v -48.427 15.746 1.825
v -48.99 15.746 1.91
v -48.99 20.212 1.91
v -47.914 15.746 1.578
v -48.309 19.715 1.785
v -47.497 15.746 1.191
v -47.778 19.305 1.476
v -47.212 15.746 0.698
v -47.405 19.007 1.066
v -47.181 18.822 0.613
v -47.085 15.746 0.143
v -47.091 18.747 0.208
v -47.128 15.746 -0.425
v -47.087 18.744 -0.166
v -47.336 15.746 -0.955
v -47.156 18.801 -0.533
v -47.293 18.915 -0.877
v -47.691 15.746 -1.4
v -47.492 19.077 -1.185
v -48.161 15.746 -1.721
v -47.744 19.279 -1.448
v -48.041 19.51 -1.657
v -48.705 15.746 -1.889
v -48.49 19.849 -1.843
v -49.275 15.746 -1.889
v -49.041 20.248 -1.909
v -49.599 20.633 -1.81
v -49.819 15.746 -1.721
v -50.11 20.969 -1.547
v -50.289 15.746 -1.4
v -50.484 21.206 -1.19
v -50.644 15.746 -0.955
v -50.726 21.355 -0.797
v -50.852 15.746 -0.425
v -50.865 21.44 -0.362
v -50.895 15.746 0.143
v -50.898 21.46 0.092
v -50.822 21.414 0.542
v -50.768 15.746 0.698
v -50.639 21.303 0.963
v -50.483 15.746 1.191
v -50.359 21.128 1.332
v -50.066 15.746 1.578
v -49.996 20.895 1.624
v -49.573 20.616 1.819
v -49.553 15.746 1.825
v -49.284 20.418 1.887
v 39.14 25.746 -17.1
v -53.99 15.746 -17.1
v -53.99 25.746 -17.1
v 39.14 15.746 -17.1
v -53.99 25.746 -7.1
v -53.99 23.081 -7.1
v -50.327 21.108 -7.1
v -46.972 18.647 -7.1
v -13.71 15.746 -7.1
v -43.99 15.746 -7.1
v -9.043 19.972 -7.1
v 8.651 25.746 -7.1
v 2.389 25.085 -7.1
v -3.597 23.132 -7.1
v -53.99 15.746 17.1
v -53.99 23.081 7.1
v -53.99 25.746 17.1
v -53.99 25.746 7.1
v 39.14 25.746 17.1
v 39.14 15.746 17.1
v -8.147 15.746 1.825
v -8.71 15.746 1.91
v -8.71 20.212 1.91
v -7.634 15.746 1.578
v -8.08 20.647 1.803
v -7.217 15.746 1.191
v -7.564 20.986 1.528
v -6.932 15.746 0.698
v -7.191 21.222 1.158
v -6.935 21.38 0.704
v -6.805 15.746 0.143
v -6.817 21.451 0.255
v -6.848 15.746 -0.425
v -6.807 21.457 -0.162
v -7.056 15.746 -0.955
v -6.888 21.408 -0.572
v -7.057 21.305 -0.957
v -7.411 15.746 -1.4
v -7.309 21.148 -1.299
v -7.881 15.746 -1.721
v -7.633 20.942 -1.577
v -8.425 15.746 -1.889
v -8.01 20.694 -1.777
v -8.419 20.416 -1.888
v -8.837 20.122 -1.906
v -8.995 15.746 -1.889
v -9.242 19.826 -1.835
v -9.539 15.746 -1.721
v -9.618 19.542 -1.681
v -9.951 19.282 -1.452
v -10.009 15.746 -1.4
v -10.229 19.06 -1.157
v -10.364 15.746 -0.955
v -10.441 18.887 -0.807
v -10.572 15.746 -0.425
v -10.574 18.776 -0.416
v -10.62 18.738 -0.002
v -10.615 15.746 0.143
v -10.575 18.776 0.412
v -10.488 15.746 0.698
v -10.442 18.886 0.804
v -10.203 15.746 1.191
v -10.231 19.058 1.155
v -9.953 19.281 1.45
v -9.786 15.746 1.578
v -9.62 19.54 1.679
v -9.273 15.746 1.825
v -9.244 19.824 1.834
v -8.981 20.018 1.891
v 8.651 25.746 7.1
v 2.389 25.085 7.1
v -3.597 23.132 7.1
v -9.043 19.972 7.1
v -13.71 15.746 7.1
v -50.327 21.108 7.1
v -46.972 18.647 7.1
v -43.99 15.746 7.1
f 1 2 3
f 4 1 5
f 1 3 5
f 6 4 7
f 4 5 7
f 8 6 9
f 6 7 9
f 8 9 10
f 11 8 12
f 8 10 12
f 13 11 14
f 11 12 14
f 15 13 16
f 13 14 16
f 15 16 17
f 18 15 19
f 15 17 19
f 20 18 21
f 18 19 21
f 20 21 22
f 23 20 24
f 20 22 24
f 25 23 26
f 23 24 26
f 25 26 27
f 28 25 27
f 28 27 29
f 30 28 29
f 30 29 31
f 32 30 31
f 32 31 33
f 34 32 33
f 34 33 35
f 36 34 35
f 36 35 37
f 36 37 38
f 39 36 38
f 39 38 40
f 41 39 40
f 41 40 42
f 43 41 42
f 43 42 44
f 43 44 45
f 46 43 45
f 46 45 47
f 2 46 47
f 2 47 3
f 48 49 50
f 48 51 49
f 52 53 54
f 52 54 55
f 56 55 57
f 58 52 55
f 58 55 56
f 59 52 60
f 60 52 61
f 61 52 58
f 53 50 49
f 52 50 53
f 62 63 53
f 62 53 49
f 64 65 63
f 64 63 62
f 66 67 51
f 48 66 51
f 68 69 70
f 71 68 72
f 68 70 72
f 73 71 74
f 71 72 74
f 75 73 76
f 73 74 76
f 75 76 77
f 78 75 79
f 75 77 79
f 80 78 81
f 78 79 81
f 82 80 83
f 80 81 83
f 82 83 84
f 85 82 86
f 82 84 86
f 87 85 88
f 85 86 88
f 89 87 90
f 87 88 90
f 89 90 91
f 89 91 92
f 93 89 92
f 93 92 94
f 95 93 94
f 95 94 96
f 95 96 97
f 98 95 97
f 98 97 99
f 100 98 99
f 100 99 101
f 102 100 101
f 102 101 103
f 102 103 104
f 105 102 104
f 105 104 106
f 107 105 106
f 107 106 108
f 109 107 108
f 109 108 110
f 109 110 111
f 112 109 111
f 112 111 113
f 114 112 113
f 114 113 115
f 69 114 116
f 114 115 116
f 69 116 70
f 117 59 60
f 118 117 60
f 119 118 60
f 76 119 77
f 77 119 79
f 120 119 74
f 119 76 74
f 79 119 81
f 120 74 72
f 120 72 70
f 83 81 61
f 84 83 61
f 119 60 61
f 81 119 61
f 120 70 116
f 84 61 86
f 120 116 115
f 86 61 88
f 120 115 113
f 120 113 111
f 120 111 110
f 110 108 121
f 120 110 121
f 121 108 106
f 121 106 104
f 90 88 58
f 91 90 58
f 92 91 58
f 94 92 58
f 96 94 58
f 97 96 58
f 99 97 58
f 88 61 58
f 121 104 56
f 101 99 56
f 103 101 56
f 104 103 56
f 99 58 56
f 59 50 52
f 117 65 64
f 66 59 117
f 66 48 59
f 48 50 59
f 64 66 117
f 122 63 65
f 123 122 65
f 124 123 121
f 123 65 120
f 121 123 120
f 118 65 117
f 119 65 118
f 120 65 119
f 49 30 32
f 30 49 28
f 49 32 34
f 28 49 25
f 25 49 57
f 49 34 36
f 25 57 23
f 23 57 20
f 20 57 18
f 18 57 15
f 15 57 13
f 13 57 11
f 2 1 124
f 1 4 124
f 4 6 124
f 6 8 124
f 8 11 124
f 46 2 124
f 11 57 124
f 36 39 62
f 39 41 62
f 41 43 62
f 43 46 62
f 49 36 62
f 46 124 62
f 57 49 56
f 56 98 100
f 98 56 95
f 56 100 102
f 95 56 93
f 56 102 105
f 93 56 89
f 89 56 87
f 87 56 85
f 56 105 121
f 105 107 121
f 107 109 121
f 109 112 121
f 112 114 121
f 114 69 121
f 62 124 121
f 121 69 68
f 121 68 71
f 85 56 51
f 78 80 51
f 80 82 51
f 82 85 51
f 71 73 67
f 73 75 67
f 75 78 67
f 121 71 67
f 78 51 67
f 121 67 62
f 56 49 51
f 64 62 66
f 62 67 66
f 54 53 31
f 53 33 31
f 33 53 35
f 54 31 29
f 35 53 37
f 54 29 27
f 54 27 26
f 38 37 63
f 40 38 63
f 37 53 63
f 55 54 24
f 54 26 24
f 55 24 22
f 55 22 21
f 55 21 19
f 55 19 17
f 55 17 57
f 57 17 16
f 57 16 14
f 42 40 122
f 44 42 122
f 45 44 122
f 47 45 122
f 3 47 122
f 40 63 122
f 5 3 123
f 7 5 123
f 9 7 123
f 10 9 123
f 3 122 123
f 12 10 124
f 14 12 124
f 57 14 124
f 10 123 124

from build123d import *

# Parameters (mm, degrees)
SKETCH_1_W                = 50.28
SKETCH_1_H                = 34.2
SKETCH_1_W_2              = 30.28
SKETCH_1_H_2              = 14.2
EXTRUDE_1_DEPTH           = 12.25
SKETCH_4_W                = 13
SKETCH_4_H                = 13.91
EXTRUDE_1_2_DEPTH         = 74.82
SKETCH_5_W                = 13.91
SKETCH_5_H                = 16.23
EXTRUDE_2_DEPTH           = 16
SKETCH_7_R                = 25.25
SKETCH_7_R_2              = 15.25
EXTRUDE_2_2_DEPTH         = 16.23
SKETCH_15_R               = 1.91
CUT_EXTRUDE_6_DEPTH       = 97.964478439
SKETCH_18_W               = 49.344544624
SKETCH_18_H               = 6.125
CUT_EXTRUDE_8_DEPTH       = 101.789238284
SKETCH_19_W               = 34.2
SKETCH_19_H               = 6.125
CUT_EXTRUDE_9_DEPTH       = 10
SKETCH_21_R               = 1.91
CUT_EXTRUDE_10_DEPTH      = 10
SKETCH_20_R               = 1.91
CUT_EXTRUDE_11_DEPTH      = 10
FILLET_START              = -7.1
FILLET_1_DEPTH            = 14.2
FILLET_2_DEPTH            = 14.2
SKETCH_29_W               = 13.91
SKETCH_29_H               = 74.82
EXTRUDE_5_DEPTH           = 10
SKETCH_30_W               = 10
SKETCH_30_H               = 58.59
CUT_EXTRUDE_13_DEPTH      = 97.964478439
SKETCH_32_W               = 34.2
SKETCH_32_H               = 5.745736365
EXTRUDE_6_DEPTH           = 10
CUT_EXTRUDE_16_DEPTH      = 50
CUT_EXTRUDE_16_DEPTH_BACK = 50
SKETCH_38_W               = 116.985630298
SKETCH_38_H               = 80.538350638
SKETCH_41_W               = 13.91
SKETCH_41_H               = 5.745736365
EXTRUDE_7_DEPTH           = 3
SKETCH_42_W               = 13
SKETCH_42_H               = 13.91
EXTRUDE_8_DEPTH           = 74.82
SKETCH_43_W               = 13.91
SKETCH_43_H               = 16.23
EXTRUDE_9_DEPTH           = 15.22
SKETCH_44_R               = 1.91
CUT_EXTRUDE_17_DEPTH      = 15.22
SKETCH_46_R               = 25.25
SKETCH_46_R_2             = 15.25
EXTRUDE_6_2_DEPTH         = 16.23
EXTRUDE_10_DEPTH          = 7.22
EXTRUDE_10_DEPTH_BACK     = 10
SKETCH_47_W               = 13.91
SKETCH_47_H               = 16.23
SKETCH_50_W               = 3.056753925
SKETCH_50_H               = 16.23
CUT_EXTRUDE_18_DEPTH      = 96.578211037
SKETCH_51_R               = 1.91
CUT_EXTRUDE_19_DEPTH      = 95.015226304
SKETCH_52_W               = 92.841945613
SKETCH_52_H               = 30
CUT_EXTRUDE_20_DEPTH      = 84.840694713
CUT_EXTRUDE_22_DEPTH      = 50
CUT_EXTRUDE_22_DEPTH_BACK = 50
SKETCH_53_W               = 63.541345486
SKETCH_53_H               = 14.170740414
SKETCH_54_W               = 10
SKETCH_54_H               = 10.145
CUT_EXTRUDE_23_DEPTH      = 50
SKETCH_55_W               = 13
SKETCH_55_H               = 13.91
EXTRUDE_11_DEPTH          = 10
SKETCH_57_W               = 15
SKETCH_57_H               = 34.2
EXTRUDE_12_DEPTH          = 10
SKETCH_58_W               = 34.2
SKETCH_58_H               = 10
EXTRUDE_13_DEPTH          = 27.85
SKETCH_60_W               = 34.2
SKETCH_60_H               = 10
EXTRUDE_14_DEPTH          = 50.28
SKETCH_62_W               = 30.28
SKETCH_62_H               = 14.2
CUT_EXTRUDE_24_DEPTH      = 50.28
SKETCH_64_R               = 1.91
CUT_EXTRUDE_25_DEPTH      = 10
FILLET_3_R                = 30
CUT_EXTRUDE_27_DEPTH      = 40
CUT_EXTRUDE_27_DEPTH_BACK = 40
SKETCH_69_W               = 103.83153819
SKETCH_69_H               = 99.848427979


with BuildPart() as part:
    # 草圖1 → Extrude 1 (new body)
    with BuildSketch(Plane(origin=(0, 0, 0), x_dir=(1, 0, 0), z_dir=(0, 1, 0))):
        Rectangle(SKETCH_1_W, SKETCH_1_H)
        Rectangle(SKETCH_1_W_2, SKETCH_1_H_2, mode=Mode.SUBTRACT)
    extrude(amount=EXTRUDE_1_DEPTH)

    # 草圖4 → Extrude 1 2 (add)
    with BuildSketch(Plane.XZ):
        with Locations((18.64, 0)):
            Rectangle(SKETCH_4_W, SKETCH_4_H)
    extrude(amount=EXTRUDE_1_2_DEPTH)

    # 草圖5 → Extrude 2 (add)
    with BuildSketch(Plane.ZY.offset(-12.14)):
        with Locations((0, -66.705)):
            Rectangle(SKETCH_5_W, SKETCH_5_H)
    extrude(amount=EXTRUDE_2_DEPTH)

    # 草圖7 → Extrude 2 2 (add)
    with BuildSketch(Plane(origin=(3.626674765, -74.82, 0), x_dir=(1, 0, 0), z_dir=(0, -1, 0))):
        with Locations((-30.978154344, 0)):
            Circle(SKETCH_7_R)
        with Locations((-30.978154344, 0)):
            Circle(SKETCH_7_R_2, mode=Mode.SUBTRACT)
    extrude(amount=-EXTRUDE_2_2_DEPTH)

    # 草圖15 → 除料-伸長6 (cut, through all)
    with BuildSketch(Plane(origin=(0, 0, -6.955), x_dir=(-1, 0, 0), z_dir=(0, 0, -1))):
        with Locations((-4.530883248, -66.705)):
            Circle(SKETCH_15_R)
    extrude(amount=-CUT_EXTRUDE_6_DEPTH, mode=Mode.SUBTRACT)

    # 草圖18 → 除料-伸長8 (cut, through all)
    with BuildSketch(Plane(origin=(0, 0, -17.1), x_dir=(-1, 0, 0), z_dir=(0, 0, -1))):
        with Locations((0.467727688, 9.1875)):
            Rectangle(SKETCH_18_W, SKETCH_18_H)
    extrude(amount=-CUT_EXTRUDE_8_DEPTH, mode=Mode.SUBTRACT)

    # 草圖19 → 除料-伸長9 (cut)
    with BuildSketch(Plane.ZY.offset(-24.204544624)):
        with Locations((0, 9.1875)):
            Rectangle(SKETCH_19_W, SKETCH_19_H)
    extrude(amount=-CUT_EXTRUDE_9_DEPTH, mode=Mode.SUBTRACT)

    # 草圖21 → 除料-伸長10 (cut)
    with BuildSketch(Plane(origin=(0, 6.125, 0), x_dir=(1, 0, 0), z_dir=(0, 1, 0))):
        with Locations(Location((17.69, 0, 0), (0, 0, 270))):
            Circle(SKETCH_21_R)
    extrude(amount=-CUT_EXTRUDE_10_DEPTH, mode=Mode.SUBTRACT)

    # 草圖20 → 除料-伸長11 (cut)
    with BuildSketch(Plane(origin=(0, 6.125, 0), x_dir=(1, 0, 0), z_dir=(0, 1, 0))):
        with Locations(Location((-17.395, 0, 0), (0, 0, 270))):
            Circle(SKETCH_20_R)
    extrude(amount=-CUT_EXTRUDE_11_DEPTH, mode=Mode.SUBTRACT)

    # 圓角1: read off the stored shape, not the designer's step
    # 圓角1 outline → 圓角1 (cut)
    with BuildSketch(Plane.XY.offset(FILLET_START)):
        with BuildLine():
            add(Edge.make_bspline(
                [(-15.14, 0), (-21.974170252, 5.199829476), (-25.14, 5.745736365)],
                knots=[0, 0, 0, 0.664102345, 0.664102345, 0.664102345], degree=2, weights=[1, 2.223777218, 1.822127795]))
            Line((-15.14, 0), (-15.14, 6.125))
            Line((-15.14, 6.125), (-25.14, 6.125))
            Line((-25.14, 6.125), (-25.14, 5.745736365))
        make_face()
    extrude(amount=FILLET_1_DEPTH, mode=Mode.SUBTRACT)

    # 圓角2: read off the stored shape, not the designer's step
    # 圓角2 outline → 圓角2 (cut)
    with BuildSketch(Plane.XY.offset(FILLET_START)):
        with BuildLine():
            Line((15.14, 6.125), (15.14, 0))
            add(Edge.make_bspline(
                [(15.14, 0), (21.974170252, 5.199829476), (25.14, 5.745736365)],
                knots=[0, 0, 0, 0.664102345, 0.664102345, 0.664102345], degree=2, weights=[1, 2.223777218, 1.822127795]))
            Line((25.14, 5.745736365), (25.14, 6.125))
            Line((25.14, 6.125), (15.14, 6.125))
        make_face()
    extrude(amount=FILLET_2_DEPTH, mode=Mode.SUBTRACT)

    # 草圖29 → 填料-伸長5 (add)
    with BuildSketch(Plane(origin=(25.14, 0, 0), x_dir=(0, 0, -1), z_dir=(1, 0, 0))):
        with Locations((0, -37.41)):
            Rectangle(SKETCH_29_W, SKETCH_29_H)
    extrude(amount=EXTRUDE_5_DEPTH)

    # 草圖30 → 除料-伸長13 (cut, through all)
    with BuildSketch(Plane.XY.offset(6.955)):
        with Locations((17.14, -29.295)):
            Rectangle(SKETCH_30_W, SKETCH_30_H)
    extrude(amount=-CUT_EXTRUDE_13_DEPTH, mode=Mode.SUBTRACT)

    # 草圖32 → Extrude 6 (add)
    with BuildSketch(Plane(origin=(25.14, 0, 0), x_dir=(0, 0, -1), z_dir=(1, 0, 0))):
        with Locations((0, 2.872868182)):
            Rectangle(SKETCH_32_W, SKETCH_32_H)
    extrude(amount=EXTRUDE_6_DEPTH)

    # 草圖38 → 除料-伸長16 (cut, two sides: drawn at the far end of the back side and taken through both)
    with BuildSketch(Plane(origin=(0, 0, -6.955), x_dir=(-1, 0, 0), z_dir=(0, 0, -1)).offset(-CUT_EXTRUDE_16_DEPTH_BACK)):
        with Locations((7.268869252, -40.269175319)):
            Rectangle(SKETCH_38_W, SKETCH_38_H)
    extrude(amount=CUT_EXTRUDE_16_DEPTH + CUT_EXTRUDE_16_DEPTH_BACK, mode=Mode.SUBTRACT)

    # 草圖41 → 填料-伸長7 (add)
    with BuildSketch(Plane(origin=(35.14, 0, 0), x_dir=(0, 0, -1), z_dir=(1, 0, 0))):
        with Locations((0, 2.872868182)):
            Rectangle(SKETCH_41_W, SKETCH_41_H)
    extrude(amount=EXTRUDE_7_DEPTH)

    # 草圖42 → 填料-伸長8 (add)
    with BuildSketch(Plane(origin=(0, 0, 0), x_dir=(-1, 0, 0), z_dir=(0, -1, 0))):
        with Locations((-31.64, 0)):
            Rectangle(SKETCH_42_W, SKETCH_42_H)
    extrude(amount=EXTRUDE_8_DEPTH)

    # 草圖43 → 填料-伸長9 (add)
    with BuildSketch(Plane.ZY.offset(-25.14)):
        with Locations((0, -66.705)):
            Rectangle(SKETCH_43_W, SKETCH_43_H)
    extrude(amount=EXTRUDE_9_DEPTH)

    # 草圖44 → 除料-伸長17 (cut)
    with BuildSketch(Plane(origin=(0, 0, -6.955), x_dir=(-1, 0, 0), z_dir=(0, 0, -1))):
        with Locations(Location((-17.524895264, -66.705, 0), (0, 0, 90))):
            Circle(SKETCH_44_R)
    extrude(amount=-CUT_EXTRUDE_17_DEPTH, mode=Mode.SUBTRACT)

    # 草圖46 → Extrude 6 2 (add)
    with BuildSketch(Plane(origin=(0, -58.59, 0), x_dir=(1, 0, 0), z_dir=(0, 1, 0))):
        with Locations((-14.35, 0)):
            Circle(SKETCH_46_R)
        with Locations((-14.35, 0)):
            Circle(SKETCH_46_R_2, mode=Mode.SUBTRACT)
    extrude(amount=-EXTRUDE_6_2_DEPTH)

    # 草圖47 → 填料-伸長10 (add, two sides: drawn at the far end of the back side and taken through both)
    with BuildSketch(Plane(origin=(-40, 0, 0), x_dir=(0, 0, -1), z_dir=(1, 0, 0)).offset(-EXTRUDE_10_DEPTH_BACK)):
        with Locations((0, -66.705)):
            Rectangle(SKETCH_47_W, SKETCH_47_H)
    extrude(amount=EXTRUDE_10_DEPTH + EXTRUDE_10_DEPTH_BACK)

    # 草圖50 → 除料-伸長18 (cut, through all)
    with BuildSketch(Plane(origin=(0, 0, -6.955), x_dir=(-1, 0, 0), z_dir=(0, 0, -1))):
        with Locations((48.471623038, -66.705)):
            Rectangle(SKETCH_50_W, SKETCH_50_H)
    extrude(amount=-CUT_EXTRUDE_18_DEPTH, mode=Mode.SUBTRACT)

    # 草圖51 → 除料-伸長19 (cut, through all)
    with BuildSketch(Plane(origin=(0, 0, -6.955), x_dir=(-1, 0, 0), z_dir=(0, 0, -1))):
        with Locations((42.786508152, -66.705)):
            Circle(SKETCH_51_R)
    extrude(amount=-CUT_EXTRUDE_19_DEPTH, mode=Mode.SUBTRACT)

    # 草圖52 → 除料-伸長20 (cut, through all)
    with BuildSketch(Plane(origin=(0, -58.59, 0), x_dir=(1, 0, 0), z_dir=(0, 1, 0))):
        with Locations((-21.280972807, 15)):
            Rectangle(SKETCH_52_W, SKETCH_52_H)
    extrude(amount=-CUT_EXTRUDE_20_DEPTH, mode=Mode.SUBTRACT)

    # 草圖53 → 除料-伸長22 (cut, two sides: drawn at the far end of the back side and taken through both)
    with BuildSketch(Plane(origin=(0, 0, -6.955), x_dir=(-1, 0, 0), z_dir=(0, 0, -1)).offset(-CUT_EXTRUDE_22_DEPTH_BACK)):
        with Locations((6.630672743, -0.960370207)):
            Rectangle(SKETCH_53_W, SKETCH_53_H)
    extrude(amount=CUT_EXTRUDE_22_DEPTH + CUT_EXTRUDE_22_DEPTH_BACK, mode=Mode.SUBTRACT)

    # 草圖54 → 除料-伸長23 (cut)
    with BuildSketch(Plane(origin=(0, 5.745736365, 0), x_dir=(1, 0, 0), z_dir=(0, 1, 0))):
        with Locations((30.14, -12.0275)):
            Rectangle(SKETCH_54_W, SKETCH_54_H)
        with Locations((30.14, 12.0275)):
            Rectangle(SKETCH_54_W, SKETCH_54_H)
    extrude(amount=-CUT_EXTRUDE_23_DEPTH, mode=Mode.SUBTRACT)

    # 草圖55 → 填料-伸長11 (add)
    with BuildSketch(Plane(origin=(0, 5.745736365, 0), x_dir=(1, 0, 0), z_dir=(0, 1, 0))):
        with Locations((31.64, 0)):
            Rectangle(SKETCH_55_W, SKETCH_55_H)
    extrude(amount=EXTRUDE_11_DEPTH)

    # 草圖57 → 填料-伸長12 (add)
    with BuildSketch(Plane(origin=(0, 15.745736365, 0), x_dir=(1, 0, 0), z_dir=(0, 1, 0))):
        with Locations((31.64, 0)):
            Rectangle(SKETCH_57_W, SKETCH_57_H)
    extrude(amount=EXTRUDE_12_DEPTH)

    # 草圖58 → 填料-伸長13 (add)
    with BuildSketch(Plane.ZY.offset(-24.14)):
        with Locations((0, 20.745736365)):
            Rectangle(SKETCH_58_W, SKETCH_58_H)
    extrude(amount=EXTRUDE_13_DEPTH)

    # 草圖60 → 填料-伸長14 (add)
    with BuildSketch(Plane.ZY.offset(3.71)):
        with Locations((0, 20.745736365)):
            Rectangle(SKETCH_60_W, SKETCH_60_H)
    extrude(amount=EXTRUDE_14_DEPTH)

    # 草圖62 → 除料-伸長24 (cut)
    with BuildSketch(Plane(origin=(0, 25.745736365, 0), x_dir=(1, 0, 0), z_dir=(0, 1, 0))):
        with Locations((-28.85, 0)):
            Rectangle(SKETCH_62_W, SKETCH_62_H)
    extrude(amount=-CUT_EXTRUDE_24_DEPTH, mode=Mode.SUBTRACT)

    # 草圖64 → 除料-伸長25 (cut)
    with BuildSketch(Plane(origin=(0, 25.745736365, 0), x_dir=(1, 0, 0), z_dir=(0, 1, 0))):
        with Locations(Location((-8.71, 0, 0), (0, 0, 270))):
            Circle(SKETCH_64_R)
        with Locations(Location((-48.99, 0, 0), (0, 0, 270))):
            Circle(SKETCH_64_R)
    extrude(amount=-CUT_EXTRUDE_25_DEPTH, mode=Mode.SUBTRACT)

    # 圓角3
    # the kernel refuses this fillet: 30 mm, written as the material it takes off along each edge
    with BuildSketch(Plane(origin=(-43.99, 25.745736365, 7.1), x_dir=(-1, 0, 0), z_dir=(0, 0, -1)), Plane(origin=(-13.71, 25.745736365, -7.1), x_dir=(1, 0, 0), z_dir=(0, 0, 1))) as fillet_3_piece_1:
        with BuildLine():
            CenterArc((22.360679775, -30), FILLET_3_R, 90, 48.189685104)
            Line((0, -10), (0, 0))
            Line((0, 0), (22.360679775, 0))
        make_face()
    extrude(amount=14.2, mode=Mode.SUBTRACT)

    # 草圖69 → 除料-伸長27 (cut, two sides: drawn at the far end of the back side and taken through both)
    with BuildSketch(Plane(origin=(0, 0, 0), x_dir=(-1, 0, 0), z_dir=(0, 0, -1)).offset(-CUT_EXTRUDE_27_DEPTH_BACK)):
        with Locations((12.775769095, -34.178477625)):
            Rectangle(SKETCH_69_W, SKETCH_69_H)
    extrude(amount=CUT_EXTRUDE_27_DEPTH + CUT_EXTRUDE_27_DEPTH_BACK, mode=Mode.SUBTRACT)


solid = part.part
